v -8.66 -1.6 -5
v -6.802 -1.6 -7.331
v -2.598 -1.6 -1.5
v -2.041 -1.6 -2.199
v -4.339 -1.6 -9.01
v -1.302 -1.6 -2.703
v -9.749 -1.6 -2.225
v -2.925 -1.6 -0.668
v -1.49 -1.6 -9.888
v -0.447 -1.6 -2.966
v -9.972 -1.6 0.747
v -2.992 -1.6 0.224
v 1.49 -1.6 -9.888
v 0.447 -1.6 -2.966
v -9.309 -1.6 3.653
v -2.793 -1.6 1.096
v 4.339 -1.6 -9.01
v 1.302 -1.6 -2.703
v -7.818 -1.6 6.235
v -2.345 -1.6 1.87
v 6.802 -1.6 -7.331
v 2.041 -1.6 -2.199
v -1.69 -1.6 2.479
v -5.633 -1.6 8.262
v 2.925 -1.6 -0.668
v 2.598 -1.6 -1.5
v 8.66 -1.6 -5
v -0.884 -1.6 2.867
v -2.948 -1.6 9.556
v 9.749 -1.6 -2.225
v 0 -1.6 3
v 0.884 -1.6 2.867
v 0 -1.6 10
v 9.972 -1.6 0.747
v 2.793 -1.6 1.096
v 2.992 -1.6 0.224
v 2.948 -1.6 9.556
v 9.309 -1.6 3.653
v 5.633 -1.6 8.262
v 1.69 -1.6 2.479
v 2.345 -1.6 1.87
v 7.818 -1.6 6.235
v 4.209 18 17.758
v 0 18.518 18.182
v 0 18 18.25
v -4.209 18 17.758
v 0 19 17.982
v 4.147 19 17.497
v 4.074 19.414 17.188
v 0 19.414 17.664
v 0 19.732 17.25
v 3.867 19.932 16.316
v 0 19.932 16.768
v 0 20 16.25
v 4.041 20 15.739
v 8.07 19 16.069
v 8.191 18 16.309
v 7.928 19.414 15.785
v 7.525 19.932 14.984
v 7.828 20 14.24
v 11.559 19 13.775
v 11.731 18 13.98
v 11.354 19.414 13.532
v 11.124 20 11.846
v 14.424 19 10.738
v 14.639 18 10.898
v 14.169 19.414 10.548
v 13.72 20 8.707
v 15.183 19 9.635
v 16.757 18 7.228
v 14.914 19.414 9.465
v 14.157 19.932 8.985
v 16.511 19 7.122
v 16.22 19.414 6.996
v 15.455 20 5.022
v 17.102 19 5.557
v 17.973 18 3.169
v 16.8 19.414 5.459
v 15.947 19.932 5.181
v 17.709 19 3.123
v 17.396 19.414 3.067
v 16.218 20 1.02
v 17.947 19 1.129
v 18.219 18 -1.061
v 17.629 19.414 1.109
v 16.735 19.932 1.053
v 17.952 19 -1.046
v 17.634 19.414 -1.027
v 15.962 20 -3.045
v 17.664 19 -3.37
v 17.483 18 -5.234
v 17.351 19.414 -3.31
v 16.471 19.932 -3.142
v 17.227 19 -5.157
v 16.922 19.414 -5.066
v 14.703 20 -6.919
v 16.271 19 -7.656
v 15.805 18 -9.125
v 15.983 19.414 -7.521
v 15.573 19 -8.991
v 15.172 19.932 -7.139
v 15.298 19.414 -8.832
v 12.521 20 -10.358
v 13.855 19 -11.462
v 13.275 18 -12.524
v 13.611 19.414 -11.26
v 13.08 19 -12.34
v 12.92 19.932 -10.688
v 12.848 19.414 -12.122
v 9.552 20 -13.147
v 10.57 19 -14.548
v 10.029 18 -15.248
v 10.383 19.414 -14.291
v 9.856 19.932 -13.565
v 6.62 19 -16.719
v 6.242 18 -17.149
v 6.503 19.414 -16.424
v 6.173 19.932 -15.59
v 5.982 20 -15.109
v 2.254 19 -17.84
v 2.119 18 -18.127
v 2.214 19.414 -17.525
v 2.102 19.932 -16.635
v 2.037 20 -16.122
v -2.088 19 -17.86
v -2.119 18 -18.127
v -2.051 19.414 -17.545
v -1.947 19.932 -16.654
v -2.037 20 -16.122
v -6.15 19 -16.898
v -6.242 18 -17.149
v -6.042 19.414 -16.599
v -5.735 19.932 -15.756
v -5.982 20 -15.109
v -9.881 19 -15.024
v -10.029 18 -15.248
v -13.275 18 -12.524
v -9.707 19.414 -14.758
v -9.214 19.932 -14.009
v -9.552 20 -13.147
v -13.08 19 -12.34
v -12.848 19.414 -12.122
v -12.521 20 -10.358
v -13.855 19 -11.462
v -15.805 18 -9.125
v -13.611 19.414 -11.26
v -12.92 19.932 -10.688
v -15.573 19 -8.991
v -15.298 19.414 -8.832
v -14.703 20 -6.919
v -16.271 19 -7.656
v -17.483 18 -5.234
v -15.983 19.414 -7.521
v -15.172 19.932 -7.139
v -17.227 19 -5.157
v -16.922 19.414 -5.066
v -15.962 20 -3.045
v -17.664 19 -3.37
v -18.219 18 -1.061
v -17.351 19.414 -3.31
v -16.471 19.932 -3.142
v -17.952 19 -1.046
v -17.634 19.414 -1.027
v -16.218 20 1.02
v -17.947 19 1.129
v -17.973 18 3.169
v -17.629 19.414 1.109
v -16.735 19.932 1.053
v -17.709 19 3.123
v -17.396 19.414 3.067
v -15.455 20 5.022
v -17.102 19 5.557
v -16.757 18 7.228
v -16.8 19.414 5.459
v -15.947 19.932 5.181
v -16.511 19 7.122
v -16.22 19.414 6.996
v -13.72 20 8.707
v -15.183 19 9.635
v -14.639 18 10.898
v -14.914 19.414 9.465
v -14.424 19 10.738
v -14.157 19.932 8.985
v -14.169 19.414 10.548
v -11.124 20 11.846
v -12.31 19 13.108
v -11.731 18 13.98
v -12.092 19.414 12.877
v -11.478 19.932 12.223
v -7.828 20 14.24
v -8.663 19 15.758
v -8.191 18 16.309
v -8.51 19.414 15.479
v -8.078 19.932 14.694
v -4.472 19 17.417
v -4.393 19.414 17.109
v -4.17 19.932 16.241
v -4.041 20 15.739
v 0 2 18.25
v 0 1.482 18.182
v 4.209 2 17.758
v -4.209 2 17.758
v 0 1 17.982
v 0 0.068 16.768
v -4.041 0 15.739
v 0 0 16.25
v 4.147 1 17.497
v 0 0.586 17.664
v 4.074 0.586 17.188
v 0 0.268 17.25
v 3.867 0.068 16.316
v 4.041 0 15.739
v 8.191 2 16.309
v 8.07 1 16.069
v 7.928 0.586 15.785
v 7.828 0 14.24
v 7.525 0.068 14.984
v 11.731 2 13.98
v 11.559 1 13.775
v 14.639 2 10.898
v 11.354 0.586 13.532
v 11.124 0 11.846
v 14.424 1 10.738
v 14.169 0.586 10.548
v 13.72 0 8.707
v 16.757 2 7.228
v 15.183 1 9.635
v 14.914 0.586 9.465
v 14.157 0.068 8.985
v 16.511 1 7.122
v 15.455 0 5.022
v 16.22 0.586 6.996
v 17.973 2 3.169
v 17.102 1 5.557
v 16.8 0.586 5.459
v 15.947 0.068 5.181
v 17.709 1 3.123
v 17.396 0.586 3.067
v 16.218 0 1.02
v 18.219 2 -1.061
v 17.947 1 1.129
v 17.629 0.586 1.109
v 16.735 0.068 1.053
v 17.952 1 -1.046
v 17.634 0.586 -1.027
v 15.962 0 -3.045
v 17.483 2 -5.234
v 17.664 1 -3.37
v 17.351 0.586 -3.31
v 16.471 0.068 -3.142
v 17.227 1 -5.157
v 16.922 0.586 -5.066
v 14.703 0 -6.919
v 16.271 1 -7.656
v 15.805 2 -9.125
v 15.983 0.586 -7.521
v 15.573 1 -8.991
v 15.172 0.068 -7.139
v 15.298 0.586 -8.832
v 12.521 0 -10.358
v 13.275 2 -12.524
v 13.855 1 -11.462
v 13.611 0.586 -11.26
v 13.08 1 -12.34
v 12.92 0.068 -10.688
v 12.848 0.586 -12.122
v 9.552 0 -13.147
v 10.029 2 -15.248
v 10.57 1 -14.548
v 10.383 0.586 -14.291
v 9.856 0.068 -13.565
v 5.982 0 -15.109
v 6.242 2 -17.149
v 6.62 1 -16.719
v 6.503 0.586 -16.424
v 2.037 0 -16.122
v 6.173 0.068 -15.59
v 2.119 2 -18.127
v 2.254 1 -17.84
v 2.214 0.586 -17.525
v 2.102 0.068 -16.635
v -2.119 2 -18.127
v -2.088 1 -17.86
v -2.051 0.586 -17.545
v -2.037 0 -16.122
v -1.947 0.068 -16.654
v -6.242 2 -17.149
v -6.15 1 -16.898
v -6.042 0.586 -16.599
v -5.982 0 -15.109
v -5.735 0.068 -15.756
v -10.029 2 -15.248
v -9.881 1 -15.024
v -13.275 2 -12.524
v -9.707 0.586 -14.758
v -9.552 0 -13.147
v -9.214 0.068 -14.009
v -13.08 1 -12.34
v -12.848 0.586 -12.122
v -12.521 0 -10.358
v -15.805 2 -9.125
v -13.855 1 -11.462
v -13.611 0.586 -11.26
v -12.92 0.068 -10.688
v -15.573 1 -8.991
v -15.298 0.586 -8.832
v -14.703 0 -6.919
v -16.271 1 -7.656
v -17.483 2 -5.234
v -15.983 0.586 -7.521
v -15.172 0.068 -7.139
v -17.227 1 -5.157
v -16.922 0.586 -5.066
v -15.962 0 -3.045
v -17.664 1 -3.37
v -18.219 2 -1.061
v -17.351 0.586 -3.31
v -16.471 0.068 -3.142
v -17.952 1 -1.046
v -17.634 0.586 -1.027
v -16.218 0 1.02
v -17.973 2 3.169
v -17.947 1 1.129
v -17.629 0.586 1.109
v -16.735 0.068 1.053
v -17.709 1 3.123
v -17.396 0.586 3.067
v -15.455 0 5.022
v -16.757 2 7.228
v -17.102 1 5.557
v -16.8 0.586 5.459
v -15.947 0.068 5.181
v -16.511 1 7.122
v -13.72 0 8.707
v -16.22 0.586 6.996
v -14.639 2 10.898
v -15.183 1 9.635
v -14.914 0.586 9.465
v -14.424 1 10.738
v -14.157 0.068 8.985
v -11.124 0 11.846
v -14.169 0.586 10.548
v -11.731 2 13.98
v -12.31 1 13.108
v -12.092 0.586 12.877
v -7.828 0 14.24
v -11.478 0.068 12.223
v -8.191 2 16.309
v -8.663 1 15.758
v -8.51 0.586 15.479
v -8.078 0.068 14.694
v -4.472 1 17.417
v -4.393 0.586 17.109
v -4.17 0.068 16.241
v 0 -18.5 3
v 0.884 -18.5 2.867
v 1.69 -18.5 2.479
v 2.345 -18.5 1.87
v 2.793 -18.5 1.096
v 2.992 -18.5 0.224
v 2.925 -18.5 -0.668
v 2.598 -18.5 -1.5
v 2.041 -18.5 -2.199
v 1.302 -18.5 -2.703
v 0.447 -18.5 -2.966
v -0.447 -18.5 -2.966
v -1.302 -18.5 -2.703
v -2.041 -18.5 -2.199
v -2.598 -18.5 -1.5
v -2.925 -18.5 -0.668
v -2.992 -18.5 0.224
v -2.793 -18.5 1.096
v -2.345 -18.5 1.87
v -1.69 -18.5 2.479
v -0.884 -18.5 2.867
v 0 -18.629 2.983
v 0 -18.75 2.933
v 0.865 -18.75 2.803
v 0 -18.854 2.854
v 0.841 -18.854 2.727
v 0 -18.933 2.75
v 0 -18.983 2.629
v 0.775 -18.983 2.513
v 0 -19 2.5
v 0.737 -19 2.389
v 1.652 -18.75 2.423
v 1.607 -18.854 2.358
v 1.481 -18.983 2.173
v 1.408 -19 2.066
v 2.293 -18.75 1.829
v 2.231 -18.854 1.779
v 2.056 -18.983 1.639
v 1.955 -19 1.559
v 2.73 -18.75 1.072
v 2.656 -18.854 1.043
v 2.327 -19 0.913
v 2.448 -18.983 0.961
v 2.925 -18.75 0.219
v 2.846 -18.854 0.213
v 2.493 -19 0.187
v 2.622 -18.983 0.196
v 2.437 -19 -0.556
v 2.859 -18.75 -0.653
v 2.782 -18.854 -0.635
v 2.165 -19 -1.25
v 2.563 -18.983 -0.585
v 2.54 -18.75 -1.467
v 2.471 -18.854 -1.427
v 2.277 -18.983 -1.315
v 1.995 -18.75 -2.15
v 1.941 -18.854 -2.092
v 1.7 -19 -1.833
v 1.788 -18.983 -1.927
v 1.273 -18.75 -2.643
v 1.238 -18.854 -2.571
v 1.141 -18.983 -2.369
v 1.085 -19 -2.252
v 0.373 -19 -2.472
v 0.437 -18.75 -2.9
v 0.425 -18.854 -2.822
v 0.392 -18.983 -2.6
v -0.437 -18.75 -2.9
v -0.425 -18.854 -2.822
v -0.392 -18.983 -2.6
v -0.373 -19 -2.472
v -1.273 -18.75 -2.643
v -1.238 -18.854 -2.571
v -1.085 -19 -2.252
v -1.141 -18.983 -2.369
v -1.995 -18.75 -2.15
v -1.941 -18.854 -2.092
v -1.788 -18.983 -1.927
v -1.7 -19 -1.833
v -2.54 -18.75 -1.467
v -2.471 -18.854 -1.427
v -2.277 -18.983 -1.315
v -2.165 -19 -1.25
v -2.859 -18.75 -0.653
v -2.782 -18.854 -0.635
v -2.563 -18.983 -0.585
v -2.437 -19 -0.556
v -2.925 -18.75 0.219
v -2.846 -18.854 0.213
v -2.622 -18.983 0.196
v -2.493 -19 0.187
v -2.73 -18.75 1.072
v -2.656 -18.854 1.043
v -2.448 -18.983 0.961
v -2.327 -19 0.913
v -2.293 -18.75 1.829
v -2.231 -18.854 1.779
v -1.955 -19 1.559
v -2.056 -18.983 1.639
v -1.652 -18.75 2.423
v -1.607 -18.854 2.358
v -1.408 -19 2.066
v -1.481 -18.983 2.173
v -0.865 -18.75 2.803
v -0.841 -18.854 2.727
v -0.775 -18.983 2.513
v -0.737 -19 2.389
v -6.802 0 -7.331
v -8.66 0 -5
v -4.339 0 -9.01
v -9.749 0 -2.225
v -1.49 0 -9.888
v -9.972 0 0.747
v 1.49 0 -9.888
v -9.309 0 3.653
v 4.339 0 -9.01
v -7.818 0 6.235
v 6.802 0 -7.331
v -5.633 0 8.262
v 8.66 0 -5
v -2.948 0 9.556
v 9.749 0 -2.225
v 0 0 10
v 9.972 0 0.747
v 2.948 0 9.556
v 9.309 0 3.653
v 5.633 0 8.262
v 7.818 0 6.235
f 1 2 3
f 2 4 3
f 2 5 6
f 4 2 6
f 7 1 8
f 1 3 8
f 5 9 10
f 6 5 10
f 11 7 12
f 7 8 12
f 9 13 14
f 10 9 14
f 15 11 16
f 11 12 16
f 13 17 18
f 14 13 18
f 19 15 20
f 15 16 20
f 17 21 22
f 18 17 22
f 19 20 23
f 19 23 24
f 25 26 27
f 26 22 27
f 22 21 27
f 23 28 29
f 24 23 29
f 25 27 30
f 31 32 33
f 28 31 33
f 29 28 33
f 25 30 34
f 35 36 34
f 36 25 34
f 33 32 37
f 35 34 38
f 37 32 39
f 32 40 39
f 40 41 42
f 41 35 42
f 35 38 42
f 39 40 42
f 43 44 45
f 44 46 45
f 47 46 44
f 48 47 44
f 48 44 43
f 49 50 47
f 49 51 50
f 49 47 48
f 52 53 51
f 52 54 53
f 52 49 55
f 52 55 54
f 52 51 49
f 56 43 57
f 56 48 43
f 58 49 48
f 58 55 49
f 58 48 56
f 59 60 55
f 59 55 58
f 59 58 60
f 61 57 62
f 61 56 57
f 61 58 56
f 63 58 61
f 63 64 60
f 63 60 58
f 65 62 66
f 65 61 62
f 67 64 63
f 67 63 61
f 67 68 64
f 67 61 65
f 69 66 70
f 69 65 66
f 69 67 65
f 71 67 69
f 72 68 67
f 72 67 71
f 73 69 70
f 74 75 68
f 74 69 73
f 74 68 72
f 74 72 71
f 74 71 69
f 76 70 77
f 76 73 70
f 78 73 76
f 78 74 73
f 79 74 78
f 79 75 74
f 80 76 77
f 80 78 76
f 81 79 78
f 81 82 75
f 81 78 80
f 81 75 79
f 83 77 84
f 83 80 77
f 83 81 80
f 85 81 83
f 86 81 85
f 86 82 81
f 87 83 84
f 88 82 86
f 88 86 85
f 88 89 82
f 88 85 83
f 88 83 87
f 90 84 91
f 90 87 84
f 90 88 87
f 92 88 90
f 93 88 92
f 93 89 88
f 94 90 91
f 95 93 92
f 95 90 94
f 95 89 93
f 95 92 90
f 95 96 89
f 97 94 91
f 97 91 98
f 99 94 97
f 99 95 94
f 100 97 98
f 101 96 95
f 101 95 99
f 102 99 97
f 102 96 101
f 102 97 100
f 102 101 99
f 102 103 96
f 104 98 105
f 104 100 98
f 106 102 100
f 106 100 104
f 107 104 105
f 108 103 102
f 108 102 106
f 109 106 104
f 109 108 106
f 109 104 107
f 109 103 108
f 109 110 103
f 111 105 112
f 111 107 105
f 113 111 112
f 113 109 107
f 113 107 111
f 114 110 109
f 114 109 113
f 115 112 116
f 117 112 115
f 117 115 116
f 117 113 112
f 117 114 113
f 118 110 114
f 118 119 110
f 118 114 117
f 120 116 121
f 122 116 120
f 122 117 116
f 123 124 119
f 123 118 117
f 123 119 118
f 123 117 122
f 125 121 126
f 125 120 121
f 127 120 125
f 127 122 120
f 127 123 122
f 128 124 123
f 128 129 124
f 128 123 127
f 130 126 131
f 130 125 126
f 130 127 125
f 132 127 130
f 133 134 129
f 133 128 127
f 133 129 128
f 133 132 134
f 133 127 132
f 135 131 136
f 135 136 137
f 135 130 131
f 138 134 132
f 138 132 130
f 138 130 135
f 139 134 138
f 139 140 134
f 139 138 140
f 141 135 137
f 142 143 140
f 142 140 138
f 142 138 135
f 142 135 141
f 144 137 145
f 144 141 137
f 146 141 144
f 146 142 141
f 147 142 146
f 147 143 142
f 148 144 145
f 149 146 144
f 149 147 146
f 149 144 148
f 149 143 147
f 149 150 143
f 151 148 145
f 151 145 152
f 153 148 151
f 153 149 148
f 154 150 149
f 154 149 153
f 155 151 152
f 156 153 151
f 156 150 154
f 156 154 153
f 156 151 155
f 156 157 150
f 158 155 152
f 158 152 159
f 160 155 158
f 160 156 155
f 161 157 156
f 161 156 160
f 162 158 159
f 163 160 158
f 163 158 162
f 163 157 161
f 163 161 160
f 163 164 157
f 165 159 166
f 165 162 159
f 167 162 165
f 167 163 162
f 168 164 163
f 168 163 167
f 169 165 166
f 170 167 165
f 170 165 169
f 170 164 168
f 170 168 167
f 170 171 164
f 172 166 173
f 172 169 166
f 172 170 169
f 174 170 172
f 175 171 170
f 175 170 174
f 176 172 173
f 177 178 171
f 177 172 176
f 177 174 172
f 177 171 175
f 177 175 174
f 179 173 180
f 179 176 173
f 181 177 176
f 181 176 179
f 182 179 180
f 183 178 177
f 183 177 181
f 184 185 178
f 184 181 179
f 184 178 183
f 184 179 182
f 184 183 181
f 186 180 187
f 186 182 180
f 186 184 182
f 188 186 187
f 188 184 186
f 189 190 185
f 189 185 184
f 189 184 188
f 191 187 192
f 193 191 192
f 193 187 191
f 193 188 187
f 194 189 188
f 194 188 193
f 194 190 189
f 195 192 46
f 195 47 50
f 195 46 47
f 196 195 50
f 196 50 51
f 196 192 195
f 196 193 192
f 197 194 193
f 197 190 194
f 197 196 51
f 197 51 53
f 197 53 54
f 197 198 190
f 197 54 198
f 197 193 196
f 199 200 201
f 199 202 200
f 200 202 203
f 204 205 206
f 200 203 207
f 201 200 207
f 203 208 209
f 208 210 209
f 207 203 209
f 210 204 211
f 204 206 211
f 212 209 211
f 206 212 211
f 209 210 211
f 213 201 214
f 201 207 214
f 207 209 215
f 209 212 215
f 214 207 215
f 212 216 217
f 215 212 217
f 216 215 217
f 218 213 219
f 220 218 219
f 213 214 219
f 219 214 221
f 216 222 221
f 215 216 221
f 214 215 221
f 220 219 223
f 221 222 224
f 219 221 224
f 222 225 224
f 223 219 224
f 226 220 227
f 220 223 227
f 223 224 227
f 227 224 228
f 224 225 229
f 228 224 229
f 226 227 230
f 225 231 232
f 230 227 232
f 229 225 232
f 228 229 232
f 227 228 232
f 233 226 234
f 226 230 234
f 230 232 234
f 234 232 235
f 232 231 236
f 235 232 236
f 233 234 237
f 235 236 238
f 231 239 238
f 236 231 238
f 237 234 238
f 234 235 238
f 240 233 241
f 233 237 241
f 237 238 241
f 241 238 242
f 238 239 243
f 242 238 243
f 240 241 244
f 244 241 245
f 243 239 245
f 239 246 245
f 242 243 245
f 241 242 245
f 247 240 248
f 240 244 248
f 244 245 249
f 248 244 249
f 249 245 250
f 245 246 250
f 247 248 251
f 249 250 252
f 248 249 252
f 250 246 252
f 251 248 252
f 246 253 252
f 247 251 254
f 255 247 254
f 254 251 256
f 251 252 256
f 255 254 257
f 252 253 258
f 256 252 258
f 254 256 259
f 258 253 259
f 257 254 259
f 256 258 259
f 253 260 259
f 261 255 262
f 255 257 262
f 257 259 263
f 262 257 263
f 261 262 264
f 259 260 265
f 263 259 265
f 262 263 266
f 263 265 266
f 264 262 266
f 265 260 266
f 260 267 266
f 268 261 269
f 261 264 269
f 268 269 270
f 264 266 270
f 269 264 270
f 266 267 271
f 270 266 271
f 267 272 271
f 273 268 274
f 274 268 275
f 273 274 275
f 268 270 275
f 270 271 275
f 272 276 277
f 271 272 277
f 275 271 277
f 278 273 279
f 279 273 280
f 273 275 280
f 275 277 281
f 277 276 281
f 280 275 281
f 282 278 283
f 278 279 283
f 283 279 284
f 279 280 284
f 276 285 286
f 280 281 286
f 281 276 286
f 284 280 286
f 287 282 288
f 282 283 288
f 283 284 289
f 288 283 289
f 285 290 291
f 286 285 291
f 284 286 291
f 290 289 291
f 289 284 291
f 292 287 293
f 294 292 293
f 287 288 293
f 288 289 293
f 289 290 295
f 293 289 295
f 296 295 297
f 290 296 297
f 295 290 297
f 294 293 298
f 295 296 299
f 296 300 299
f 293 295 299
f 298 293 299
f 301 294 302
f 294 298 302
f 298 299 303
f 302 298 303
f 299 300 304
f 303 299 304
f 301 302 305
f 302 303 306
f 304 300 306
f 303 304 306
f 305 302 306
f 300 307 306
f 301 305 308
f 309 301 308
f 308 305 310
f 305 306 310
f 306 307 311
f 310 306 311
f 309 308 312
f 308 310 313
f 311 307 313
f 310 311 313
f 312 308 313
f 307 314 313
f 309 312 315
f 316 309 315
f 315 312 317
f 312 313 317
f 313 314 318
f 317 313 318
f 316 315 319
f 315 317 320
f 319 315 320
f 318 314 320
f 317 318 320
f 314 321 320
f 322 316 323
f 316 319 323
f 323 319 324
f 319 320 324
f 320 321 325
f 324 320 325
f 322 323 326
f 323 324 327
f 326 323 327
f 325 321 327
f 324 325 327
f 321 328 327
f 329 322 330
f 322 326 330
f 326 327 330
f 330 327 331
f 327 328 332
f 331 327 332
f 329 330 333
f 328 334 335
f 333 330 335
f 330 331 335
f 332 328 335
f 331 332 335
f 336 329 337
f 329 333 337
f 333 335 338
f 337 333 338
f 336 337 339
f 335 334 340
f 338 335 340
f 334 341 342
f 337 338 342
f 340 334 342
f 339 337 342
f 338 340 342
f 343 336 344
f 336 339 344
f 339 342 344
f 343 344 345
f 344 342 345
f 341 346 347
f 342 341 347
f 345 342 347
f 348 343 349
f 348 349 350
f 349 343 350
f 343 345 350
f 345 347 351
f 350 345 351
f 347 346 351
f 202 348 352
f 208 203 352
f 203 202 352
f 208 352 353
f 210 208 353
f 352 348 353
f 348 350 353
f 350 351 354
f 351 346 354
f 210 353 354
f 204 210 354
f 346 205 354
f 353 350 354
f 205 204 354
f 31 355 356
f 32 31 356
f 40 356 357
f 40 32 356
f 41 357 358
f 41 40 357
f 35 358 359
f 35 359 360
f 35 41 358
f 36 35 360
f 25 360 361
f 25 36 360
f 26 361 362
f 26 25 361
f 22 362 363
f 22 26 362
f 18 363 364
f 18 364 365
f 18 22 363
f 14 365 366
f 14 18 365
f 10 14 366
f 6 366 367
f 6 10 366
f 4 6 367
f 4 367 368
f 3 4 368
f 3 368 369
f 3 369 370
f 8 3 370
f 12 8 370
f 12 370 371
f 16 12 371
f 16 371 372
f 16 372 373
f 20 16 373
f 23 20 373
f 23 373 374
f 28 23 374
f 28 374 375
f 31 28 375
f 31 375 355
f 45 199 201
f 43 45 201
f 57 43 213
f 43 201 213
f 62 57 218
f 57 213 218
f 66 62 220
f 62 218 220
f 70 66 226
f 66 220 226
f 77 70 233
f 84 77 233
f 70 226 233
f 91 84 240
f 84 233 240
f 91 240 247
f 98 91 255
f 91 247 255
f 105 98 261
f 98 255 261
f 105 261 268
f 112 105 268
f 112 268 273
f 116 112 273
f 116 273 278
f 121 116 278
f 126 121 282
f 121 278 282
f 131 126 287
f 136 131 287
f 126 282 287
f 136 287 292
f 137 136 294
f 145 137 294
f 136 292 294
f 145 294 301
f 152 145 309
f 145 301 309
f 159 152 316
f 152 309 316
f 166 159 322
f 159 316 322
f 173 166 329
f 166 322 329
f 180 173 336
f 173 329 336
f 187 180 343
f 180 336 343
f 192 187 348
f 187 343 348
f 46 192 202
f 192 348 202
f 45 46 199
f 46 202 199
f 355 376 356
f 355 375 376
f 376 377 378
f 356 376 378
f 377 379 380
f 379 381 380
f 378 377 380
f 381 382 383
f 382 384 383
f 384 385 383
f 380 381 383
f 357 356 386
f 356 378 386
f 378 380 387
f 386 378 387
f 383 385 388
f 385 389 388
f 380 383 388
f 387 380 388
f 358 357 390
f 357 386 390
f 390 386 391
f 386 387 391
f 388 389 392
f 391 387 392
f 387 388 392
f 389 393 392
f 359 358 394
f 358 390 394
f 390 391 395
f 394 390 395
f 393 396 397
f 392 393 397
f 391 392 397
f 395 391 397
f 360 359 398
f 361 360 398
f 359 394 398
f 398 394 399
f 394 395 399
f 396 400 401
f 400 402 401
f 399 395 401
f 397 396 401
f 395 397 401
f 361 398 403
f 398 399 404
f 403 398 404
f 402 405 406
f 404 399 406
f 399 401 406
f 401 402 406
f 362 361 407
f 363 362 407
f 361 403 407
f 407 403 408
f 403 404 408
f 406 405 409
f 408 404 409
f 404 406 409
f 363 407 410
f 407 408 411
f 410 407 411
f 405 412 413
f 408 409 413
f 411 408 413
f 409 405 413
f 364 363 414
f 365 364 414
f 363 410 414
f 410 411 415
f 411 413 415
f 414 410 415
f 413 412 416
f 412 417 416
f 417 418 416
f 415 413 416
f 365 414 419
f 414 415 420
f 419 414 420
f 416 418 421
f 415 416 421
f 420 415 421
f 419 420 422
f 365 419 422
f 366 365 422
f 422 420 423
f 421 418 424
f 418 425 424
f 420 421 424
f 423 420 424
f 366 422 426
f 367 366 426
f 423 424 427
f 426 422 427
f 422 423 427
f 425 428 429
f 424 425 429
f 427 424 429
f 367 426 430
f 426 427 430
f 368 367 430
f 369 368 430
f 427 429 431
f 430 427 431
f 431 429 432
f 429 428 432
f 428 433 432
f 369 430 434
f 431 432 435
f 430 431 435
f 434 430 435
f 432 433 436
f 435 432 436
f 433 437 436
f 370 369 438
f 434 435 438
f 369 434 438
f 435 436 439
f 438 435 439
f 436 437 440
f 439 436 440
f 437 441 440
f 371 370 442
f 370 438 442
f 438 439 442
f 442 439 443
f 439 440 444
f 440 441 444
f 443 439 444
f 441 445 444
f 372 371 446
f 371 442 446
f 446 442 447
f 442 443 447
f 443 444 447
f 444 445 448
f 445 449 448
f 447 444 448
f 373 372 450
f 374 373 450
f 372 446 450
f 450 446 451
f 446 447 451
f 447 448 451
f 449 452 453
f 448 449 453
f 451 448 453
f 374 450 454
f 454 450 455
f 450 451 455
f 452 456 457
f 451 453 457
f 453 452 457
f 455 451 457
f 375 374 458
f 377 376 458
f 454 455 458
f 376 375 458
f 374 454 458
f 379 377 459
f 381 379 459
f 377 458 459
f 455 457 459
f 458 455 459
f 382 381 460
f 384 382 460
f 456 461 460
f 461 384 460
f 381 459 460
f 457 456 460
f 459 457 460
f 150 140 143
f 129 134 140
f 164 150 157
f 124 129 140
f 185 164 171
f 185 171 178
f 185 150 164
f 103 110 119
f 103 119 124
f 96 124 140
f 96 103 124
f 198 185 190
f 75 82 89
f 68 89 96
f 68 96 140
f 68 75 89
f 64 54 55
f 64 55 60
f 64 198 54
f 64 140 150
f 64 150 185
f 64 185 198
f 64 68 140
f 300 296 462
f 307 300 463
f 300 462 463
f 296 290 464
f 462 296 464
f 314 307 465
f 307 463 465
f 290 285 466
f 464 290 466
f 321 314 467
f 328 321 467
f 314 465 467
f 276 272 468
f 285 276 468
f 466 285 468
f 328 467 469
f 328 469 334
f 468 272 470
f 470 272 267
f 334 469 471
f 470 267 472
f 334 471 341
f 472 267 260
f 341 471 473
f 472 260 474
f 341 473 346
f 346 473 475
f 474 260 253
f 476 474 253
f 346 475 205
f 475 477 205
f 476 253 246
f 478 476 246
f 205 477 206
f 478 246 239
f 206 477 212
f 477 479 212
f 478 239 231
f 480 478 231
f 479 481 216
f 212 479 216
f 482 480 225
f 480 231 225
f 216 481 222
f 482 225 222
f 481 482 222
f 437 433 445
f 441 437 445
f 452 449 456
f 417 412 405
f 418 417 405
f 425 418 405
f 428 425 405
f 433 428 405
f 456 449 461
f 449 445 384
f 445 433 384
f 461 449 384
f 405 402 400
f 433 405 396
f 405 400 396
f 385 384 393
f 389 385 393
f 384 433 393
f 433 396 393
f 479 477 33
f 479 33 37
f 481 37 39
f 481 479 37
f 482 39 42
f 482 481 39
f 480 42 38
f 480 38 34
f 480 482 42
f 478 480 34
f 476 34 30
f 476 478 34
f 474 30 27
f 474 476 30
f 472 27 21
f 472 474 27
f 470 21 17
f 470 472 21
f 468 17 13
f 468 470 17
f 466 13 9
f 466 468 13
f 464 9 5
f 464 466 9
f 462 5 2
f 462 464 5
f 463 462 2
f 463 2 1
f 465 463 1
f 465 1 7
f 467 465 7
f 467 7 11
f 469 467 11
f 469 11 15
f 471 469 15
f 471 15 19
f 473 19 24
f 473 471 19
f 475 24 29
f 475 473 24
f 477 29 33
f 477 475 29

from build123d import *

# Parameters (mm, degrees)
SKETCH_1_R      = 18.25
EXTRUDE_1_DEPTH = 20
FILLET_1_R      = 2
SKETCH_2_R      = 10
EXTRUDE_2_DEPTH = 1.6
SKETCH_3_R      = 3
EXTRUDE_3_DEPTH = 19
FILLET_2_R      = 0.5


with BuildPart() as part:
    # 草图1 → 凸台-拉伸1 (new body)
    with BuildSketch(Plane(origin=(0, 0, 0), x_dir=(1, 0, 0), z_dir=(0, 1, 0))):
        with Locations(Location((0, 0, 0), (0, 0, 270))):
            Circle(SKETCH_1_R)
    extrude(amount=EXTRUDE_1_DEPTH)

    # 圆角1
    fillet_1_edges = [part.edges().sort_by_distance(p)[0] for p in [
        (0, 0, -18.25),
        (0, 20, -18.25),
    ]]
    fillet(fillet_1_edges, radius=FILLET_1_R)

    # 草图2 → 凸台-拉伸2 (add)
    with BuildSketch(Plane(origin=(0, 0, 0), x_dir=(1, 0, 0), z_dir=(0, 1, 0))):
        with Locations(Location((0, 0, 0), (0, 0, 270))):
            Circle(SKETCH_2_R)
    extrude(amount=-EXTRUDE_2_DEPTH)

    # 草图3 → 凸台-拉伸3 (add)
    with BuildSketch(Plane(origin=(0, 0, 0), x_dir=(1, 0, 0), z_dir=(0, 1, 0))):
        with Locations(Location((0, 0, 0), (0, 0, 270))):
            Circle(SKETCH_3_R)
    extrude(amount=-EXTRUDE_3_DEPTH)

    # 圆角2
    fillet_2_edges = [part.edges().sort_by_distance(p)[0] for p in [
        (0, -19, -3),
    ]]
    fillet(fillet_2_edges, radius=FILLET_2_R)


solid = part.part
